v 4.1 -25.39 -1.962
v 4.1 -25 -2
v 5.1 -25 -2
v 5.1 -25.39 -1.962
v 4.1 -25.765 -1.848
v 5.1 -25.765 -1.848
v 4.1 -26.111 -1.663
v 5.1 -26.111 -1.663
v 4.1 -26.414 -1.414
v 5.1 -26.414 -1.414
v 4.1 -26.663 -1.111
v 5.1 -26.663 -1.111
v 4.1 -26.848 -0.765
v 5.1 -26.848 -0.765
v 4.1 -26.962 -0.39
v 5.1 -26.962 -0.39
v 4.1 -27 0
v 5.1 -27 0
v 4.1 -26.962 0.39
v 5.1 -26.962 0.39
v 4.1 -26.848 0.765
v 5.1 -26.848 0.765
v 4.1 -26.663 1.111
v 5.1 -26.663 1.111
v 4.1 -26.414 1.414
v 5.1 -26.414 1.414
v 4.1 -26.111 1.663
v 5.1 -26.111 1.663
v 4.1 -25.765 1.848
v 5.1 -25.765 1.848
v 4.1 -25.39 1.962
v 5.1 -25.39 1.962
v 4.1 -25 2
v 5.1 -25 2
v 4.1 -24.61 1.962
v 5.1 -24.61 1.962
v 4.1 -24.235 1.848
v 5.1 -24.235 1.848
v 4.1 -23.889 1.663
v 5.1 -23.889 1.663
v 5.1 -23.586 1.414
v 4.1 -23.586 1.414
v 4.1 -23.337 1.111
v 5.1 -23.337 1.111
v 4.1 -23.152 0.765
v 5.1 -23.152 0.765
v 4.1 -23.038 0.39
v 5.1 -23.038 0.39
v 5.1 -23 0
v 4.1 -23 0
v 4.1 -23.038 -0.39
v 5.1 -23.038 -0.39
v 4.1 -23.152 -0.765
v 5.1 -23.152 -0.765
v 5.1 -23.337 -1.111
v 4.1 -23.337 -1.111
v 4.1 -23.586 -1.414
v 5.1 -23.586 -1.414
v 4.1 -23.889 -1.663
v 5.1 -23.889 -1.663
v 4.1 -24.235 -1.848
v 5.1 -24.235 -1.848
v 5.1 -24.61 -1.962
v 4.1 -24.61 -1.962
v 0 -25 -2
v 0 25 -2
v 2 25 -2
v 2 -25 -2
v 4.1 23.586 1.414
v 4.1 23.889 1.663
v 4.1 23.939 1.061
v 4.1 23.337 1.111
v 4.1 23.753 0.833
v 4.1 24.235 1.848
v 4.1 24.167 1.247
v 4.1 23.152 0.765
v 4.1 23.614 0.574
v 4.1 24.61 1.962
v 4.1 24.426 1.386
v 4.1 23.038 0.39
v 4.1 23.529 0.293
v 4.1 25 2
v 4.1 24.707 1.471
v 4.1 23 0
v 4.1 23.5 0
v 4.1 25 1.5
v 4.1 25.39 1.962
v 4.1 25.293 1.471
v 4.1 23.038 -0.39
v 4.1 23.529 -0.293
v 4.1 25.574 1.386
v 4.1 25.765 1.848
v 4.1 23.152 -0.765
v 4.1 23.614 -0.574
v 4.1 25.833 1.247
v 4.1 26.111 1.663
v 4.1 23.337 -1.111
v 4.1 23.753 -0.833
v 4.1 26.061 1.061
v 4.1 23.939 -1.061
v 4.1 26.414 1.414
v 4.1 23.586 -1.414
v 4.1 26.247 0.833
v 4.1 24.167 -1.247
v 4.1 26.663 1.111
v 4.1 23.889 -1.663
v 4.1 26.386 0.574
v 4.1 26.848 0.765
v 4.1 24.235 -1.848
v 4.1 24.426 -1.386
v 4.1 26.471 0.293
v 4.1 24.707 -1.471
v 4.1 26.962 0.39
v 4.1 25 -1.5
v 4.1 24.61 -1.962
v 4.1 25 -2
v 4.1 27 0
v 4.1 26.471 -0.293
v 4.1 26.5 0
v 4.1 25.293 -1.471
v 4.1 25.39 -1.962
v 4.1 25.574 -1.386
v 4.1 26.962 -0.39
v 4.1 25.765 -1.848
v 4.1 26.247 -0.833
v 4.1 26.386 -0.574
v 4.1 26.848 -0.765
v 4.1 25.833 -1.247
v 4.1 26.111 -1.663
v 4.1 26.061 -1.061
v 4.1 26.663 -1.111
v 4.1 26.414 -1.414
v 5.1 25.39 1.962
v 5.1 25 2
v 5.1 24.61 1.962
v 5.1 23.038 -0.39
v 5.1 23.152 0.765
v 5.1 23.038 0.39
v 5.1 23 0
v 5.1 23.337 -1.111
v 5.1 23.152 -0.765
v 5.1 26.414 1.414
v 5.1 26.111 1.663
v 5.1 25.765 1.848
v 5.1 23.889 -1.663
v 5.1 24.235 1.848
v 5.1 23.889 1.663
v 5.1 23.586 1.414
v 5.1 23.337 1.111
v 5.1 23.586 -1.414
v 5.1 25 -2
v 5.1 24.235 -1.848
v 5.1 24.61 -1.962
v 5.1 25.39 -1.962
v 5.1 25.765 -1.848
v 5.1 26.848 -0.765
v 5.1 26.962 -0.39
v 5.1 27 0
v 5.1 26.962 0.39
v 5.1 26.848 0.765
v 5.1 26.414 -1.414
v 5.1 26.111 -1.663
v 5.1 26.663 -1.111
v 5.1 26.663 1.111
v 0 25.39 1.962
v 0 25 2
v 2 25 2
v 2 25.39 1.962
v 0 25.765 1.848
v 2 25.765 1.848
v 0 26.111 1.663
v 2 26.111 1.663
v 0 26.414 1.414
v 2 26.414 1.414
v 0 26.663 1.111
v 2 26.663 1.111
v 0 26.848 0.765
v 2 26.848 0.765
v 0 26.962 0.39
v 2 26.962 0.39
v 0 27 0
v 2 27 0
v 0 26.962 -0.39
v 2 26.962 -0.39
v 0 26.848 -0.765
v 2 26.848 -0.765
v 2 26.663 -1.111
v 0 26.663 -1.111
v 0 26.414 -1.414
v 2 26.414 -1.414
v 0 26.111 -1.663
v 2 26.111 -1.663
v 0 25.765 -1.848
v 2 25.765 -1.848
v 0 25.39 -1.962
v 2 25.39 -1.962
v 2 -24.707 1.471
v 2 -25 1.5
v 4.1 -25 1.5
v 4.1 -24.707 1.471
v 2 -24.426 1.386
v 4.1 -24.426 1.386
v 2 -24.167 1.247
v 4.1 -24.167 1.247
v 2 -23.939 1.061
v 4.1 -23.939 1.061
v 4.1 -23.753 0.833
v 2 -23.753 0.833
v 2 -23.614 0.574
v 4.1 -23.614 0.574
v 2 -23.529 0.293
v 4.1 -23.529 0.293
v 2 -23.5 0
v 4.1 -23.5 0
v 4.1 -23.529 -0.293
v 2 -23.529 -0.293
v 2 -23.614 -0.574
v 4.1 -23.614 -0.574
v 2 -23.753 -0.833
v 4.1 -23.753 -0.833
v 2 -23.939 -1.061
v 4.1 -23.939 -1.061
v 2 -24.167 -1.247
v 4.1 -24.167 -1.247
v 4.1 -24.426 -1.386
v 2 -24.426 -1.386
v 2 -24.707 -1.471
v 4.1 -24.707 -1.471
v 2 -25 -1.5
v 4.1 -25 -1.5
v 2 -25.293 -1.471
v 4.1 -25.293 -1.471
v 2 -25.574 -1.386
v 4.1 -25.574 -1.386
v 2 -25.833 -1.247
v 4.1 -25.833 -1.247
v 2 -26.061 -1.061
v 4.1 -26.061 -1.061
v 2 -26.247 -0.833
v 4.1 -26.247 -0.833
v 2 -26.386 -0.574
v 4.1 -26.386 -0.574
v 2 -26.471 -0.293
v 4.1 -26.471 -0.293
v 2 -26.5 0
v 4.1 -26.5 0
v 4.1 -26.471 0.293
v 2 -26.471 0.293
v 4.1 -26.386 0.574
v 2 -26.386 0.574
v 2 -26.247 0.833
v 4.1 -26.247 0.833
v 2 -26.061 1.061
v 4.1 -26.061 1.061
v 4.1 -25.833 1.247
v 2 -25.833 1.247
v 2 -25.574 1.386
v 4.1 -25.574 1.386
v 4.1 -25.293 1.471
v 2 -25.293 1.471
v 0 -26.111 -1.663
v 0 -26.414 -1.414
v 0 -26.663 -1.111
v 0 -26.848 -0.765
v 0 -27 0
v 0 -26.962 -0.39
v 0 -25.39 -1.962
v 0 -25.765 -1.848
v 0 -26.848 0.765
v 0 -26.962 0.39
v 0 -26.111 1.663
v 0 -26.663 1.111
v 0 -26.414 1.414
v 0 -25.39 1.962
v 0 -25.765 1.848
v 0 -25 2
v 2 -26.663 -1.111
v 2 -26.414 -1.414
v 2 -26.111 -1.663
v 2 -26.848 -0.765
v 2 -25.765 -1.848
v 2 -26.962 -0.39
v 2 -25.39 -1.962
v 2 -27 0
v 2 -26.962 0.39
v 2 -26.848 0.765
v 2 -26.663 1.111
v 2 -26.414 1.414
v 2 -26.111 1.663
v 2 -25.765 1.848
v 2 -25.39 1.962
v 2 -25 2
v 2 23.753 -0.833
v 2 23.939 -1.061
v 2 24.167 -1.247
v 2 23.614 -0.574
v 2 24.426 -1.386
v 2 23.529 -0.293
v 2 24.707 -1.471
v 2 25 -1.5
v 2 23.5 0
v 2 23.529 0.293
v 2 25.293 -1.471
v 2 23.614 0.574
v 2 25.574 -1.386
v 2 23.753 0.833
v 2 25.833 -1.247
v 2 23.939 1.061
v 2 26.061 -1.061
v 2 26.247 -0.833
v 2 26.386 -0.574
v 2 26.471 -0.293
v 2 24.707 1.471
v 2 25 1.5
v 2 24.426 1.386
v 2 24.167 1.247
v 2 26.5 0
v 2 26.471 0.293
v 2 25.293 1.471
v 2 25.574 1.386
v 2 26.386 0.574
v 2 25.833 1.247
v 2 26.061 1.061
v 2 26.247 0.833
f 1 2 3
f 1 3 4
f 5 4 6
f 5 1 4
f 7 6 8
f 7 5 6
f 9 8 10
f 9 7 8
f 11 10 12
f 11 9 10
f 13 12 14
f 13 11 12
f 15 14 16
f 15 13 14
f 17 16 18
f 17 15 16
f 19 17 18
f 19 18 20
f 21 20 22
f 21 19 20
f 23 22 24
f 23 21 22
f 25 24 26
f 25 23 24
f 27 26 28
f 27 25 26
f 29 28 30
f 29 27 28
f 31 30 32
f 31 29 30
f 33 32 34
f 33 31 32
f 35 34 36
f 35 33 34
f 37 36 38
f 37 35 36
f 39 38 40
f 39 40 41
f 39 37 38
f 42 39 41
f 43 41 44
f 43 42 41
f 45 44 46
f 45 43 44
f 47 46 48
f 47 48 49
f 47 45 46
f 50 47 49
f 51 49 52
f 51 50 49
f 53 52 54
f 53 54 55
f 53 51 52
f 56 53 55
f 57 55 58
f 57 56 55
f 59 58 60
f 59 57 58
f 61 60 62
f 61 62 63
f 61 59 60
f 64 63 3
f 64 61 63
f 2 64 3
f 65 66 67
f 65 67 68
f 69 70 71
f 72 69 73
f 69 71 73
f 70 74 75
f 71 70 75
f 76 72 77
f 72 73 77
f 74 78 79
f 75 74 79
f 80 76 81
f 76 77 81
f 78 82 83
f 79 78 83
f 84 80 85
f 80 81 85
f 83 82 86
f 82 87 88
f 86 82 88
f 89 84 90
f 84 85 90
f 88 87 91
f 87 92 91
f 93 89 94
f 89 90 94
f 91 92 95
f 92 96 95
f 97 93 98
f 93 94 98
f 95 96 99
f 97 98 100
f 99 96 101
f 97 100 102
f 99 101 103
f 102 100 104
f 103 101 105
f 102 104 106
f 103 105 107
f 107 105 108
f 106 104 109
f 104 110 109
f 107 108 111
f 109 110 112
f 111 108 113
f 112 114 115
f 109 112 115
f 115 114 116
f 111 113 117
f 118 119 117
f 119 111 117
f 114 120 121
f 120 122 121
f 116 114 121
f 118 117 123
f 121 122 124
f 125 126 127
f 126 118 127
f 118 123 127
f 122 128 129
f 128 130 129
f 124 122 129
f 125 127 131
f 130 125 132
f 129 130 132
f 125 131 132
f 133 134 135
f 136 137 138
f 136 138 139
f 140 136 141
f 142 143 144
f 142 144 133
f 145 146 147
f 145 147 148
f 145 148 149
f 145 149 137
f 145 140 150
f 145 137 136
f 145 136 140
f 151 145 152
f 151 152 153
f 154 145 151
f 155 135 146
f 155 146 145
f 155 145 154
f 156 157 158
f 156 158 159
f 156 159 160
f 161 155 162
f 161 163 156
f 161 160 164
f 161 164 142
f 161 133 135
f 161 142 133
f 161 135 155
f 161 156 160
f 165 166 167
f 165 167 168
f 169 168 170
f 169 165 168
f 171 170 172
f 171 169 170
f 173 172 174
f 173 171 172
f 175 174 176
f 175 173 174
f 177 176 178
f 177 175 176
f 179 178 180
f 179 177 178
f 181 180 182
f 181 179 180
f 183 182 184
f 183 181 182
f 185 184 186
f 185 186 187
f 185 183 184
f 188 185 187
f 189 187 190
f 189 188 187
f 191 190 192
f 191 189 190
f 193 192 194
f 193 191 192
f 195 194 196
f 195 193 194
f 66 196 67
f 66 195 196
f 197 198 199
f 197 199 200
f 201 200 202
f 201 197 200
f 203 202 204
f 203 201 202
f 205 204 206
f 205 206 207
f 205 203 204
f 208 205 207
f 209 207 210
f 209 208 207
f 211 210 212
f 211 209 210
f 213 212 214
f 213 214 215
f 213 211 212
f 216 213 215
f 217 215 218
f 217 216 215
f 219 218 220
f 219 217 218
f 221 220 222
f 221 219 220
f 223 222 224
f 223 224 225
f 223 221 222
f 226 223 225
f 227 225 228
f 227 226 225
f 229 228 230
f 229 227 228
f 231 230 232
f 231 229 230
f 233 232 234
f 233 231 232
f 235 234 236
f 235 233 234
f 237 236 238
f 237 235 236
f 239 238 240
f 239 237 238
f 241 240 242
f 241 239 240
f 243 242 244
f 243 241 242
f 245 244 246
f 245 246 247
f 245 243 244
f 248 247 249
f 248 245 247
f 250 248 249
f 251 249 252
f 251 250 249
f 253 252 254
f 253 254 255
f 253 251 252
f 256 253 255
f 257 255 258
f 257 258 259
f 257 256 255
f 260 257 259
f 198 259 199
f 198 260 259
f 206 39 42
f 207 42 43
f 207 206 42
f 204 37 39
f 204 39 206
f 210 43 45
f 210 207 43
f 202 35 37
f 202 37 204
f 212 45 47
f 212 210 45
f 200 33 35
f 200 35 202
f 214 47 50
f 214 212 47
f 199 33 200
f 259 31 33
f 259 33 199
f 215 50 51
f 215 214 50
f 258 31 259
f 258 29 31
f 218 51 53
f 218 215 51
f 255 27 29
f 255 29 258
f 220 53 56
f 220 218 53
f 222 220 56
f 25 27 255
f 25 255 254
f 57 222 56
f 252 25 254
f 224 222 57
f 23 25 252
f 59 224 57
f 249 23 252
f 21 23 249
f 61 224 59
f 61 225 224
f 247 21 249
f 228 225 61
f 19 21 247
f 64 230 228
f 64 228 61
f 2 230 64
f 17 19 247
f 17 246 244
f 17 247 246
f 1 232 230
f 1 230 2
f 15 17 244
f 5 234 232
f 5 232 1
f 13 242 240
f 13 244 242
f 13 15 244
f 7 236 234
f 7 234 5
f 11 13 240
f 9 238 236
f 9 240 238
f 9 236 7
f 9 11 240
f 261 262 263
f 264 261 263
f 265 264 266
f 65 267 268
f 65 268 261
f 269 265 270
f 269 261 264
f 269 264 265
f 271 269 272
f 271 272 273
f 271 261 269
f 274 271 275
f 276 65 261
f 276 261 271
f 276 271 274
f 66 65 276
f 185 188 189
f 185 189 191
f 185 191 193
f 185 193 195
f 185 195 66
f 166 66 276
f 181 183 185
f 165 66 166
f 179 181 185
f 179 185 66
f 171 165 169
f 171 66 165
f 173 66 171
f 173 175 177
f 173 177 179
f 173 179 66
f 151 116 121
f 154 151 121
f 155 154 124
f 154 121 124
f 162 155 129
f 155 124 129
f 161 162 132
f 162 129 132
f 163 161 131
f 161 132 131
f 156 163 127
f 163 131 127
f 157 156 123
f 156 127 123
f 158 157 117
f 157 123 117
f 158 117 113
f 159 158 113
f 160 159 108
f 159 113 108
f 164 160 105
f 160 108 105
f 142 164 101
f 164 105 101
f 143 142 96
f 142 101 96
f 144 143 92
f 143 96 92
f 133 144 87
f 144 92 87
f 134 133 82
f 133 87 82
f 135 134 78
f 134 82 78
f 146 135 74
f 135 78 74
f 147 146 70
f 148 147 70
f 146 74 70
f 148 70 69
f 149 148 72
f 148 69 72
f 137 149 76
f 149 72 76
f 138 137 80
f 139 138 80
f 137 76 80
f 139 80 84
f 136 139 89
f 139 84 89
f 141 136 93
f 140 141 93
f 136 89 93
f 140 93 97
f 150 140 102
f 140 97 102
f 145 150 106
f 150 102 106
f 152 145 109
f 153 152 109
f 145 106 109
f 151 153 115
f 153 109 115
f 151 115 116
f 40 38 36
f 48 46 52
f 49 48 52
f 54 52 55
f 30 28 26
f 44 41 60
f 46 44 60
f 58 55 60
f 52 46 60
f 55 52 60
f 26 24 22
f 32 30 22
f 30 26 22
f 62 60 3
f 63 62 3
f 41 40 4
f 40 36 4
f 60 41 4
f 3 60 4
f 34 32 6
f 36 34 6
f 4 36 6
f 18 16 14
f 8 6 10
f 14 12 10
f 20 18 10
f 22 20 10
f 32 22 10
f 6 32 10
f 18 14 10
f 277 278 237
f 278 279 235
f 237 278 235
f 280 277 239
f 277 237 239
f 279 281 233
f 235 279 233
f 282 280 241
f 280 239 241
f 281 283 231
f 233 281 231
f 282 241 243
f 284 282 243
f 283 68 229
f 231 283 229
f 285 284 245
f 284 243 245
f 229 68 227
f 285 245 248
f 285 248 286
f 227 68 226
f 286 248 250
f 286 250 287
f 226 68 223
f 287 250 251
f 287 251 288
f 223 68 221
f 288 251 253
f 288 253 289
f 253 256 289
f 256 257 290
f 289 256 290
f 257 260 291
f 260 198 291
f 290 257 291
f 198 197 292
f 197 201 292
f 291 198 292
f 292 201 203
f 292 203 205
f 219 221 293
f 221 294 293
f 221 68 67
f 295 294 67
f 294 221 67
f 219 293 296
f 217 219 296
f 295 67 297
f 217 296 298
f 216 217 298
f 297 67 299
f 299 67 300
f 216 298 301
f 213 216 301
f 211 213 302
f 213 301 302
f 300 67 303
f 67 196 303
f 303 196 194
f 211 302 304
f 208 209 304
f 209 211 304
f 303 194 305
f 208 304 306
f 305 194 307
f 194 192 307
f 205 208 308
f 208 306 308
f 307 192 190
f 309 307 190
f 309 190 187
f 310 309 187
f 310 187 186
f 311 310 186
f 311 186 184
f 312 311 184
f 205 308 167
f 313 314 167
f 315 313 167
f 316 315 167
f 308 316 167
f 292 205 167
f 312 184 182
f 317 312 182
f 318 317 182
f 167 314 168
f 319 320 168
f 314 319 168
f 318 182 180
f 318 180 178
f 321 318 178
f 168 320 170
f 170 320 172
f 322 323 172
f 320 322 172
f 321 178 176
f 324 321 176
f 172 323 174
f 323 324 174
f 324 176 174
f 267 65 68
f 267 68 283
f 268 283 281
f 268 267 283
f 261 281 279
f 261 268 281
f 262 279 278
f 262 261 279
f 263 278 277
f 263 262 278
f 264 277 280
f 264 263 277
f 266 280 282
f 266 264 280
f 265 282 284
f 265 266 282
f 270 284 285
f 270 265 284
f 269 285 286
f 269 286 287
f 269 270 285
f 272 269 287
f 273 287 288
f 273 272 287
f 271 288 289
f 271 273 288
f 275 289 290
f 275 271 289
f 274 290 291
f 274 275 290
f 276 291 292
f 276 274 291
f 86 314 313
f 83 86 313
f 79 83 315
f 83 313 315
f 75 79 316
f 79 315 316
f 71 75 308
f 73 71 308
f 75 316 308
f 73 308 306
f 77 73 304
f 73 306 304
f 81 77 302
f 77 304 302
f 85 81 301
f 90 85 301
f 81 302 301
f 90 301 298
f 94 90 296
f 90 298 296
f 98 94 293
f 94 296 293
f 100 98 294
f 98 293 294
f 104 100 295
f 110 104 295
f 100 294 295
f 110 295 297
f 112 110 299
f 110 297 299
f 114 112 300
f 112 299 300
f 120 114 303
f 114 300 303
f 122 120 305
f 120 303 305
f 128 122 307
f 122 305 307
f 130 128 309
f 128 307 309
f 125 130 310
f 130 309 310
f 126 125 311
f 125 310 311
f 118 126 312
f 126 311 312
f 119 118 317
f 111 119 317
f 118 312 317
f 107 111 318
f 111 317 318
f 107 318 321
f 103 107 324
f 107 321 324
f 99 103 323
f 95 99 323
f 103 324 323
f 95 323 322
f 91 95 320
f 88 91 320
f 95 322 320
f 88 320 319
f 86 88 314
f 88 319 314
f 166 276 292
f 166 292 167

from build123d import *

# Parameters (mm, degrees)
BASE_DEPTH         = 2
ESQUISSE2_R        = 1.5
BOSS_FIX_DEPTH     = 2.1
ESQUISSE3_R        = 2
BOSS_BLOCAGE_DEPTH = 1


with BuildPart() as part:
    # Esquisse1 → BASE (new body)
    with BuildSketch(Plane(origin=(0, 0, 0), x_dir=(0, 0, -1), z_dir=(1, 0, 0))):
        with BuildLine():
            Line((2, 25), (2, -25))
            ThreePointArc((2, -25), (0, -27), (-2, -25))
            Line((-2, -25), (-2, 25))
            ThreePointArc((-2, 25), (0, 27), (2, 25))
        make_face()
    extrude(amount=BASE_DEPTH)

    # Esquisse2 → BOSS FIX (add)
    with BuildSketch(Plane(origin=(2, 0, 0), x_dir=(0, 0, -1), z_dir=(1, 0, 0))):
        with Locations(Location((0, 25, 0), (0, 0, 180))):
            Circle(ESQUISSE2_R)
    boss_fix = extrude(amount=BOSS_FIX_DEPTH)

    # Esquisse3 → BOSS BLOCAGE (add)
    with BuildSketch(Plane(origin=(4.1, 0, 0), x_dir=(0, 0, -1), z_dir=(1, 0, 0))):
        with Locations((0, 25)):
            Circle(ESQUISSE3_R)
    boss_blocage = extrude(amount=BOSS_BLOCAGE_DEPTH)

    # SYM FIXATION: BOSS FIX, BOSS BLOCAGE across plane
    add(boss_fix.mirror(Plane.ZX))
    add(boss_blocage.mirror(Plane.ZX))


solid = part.part
